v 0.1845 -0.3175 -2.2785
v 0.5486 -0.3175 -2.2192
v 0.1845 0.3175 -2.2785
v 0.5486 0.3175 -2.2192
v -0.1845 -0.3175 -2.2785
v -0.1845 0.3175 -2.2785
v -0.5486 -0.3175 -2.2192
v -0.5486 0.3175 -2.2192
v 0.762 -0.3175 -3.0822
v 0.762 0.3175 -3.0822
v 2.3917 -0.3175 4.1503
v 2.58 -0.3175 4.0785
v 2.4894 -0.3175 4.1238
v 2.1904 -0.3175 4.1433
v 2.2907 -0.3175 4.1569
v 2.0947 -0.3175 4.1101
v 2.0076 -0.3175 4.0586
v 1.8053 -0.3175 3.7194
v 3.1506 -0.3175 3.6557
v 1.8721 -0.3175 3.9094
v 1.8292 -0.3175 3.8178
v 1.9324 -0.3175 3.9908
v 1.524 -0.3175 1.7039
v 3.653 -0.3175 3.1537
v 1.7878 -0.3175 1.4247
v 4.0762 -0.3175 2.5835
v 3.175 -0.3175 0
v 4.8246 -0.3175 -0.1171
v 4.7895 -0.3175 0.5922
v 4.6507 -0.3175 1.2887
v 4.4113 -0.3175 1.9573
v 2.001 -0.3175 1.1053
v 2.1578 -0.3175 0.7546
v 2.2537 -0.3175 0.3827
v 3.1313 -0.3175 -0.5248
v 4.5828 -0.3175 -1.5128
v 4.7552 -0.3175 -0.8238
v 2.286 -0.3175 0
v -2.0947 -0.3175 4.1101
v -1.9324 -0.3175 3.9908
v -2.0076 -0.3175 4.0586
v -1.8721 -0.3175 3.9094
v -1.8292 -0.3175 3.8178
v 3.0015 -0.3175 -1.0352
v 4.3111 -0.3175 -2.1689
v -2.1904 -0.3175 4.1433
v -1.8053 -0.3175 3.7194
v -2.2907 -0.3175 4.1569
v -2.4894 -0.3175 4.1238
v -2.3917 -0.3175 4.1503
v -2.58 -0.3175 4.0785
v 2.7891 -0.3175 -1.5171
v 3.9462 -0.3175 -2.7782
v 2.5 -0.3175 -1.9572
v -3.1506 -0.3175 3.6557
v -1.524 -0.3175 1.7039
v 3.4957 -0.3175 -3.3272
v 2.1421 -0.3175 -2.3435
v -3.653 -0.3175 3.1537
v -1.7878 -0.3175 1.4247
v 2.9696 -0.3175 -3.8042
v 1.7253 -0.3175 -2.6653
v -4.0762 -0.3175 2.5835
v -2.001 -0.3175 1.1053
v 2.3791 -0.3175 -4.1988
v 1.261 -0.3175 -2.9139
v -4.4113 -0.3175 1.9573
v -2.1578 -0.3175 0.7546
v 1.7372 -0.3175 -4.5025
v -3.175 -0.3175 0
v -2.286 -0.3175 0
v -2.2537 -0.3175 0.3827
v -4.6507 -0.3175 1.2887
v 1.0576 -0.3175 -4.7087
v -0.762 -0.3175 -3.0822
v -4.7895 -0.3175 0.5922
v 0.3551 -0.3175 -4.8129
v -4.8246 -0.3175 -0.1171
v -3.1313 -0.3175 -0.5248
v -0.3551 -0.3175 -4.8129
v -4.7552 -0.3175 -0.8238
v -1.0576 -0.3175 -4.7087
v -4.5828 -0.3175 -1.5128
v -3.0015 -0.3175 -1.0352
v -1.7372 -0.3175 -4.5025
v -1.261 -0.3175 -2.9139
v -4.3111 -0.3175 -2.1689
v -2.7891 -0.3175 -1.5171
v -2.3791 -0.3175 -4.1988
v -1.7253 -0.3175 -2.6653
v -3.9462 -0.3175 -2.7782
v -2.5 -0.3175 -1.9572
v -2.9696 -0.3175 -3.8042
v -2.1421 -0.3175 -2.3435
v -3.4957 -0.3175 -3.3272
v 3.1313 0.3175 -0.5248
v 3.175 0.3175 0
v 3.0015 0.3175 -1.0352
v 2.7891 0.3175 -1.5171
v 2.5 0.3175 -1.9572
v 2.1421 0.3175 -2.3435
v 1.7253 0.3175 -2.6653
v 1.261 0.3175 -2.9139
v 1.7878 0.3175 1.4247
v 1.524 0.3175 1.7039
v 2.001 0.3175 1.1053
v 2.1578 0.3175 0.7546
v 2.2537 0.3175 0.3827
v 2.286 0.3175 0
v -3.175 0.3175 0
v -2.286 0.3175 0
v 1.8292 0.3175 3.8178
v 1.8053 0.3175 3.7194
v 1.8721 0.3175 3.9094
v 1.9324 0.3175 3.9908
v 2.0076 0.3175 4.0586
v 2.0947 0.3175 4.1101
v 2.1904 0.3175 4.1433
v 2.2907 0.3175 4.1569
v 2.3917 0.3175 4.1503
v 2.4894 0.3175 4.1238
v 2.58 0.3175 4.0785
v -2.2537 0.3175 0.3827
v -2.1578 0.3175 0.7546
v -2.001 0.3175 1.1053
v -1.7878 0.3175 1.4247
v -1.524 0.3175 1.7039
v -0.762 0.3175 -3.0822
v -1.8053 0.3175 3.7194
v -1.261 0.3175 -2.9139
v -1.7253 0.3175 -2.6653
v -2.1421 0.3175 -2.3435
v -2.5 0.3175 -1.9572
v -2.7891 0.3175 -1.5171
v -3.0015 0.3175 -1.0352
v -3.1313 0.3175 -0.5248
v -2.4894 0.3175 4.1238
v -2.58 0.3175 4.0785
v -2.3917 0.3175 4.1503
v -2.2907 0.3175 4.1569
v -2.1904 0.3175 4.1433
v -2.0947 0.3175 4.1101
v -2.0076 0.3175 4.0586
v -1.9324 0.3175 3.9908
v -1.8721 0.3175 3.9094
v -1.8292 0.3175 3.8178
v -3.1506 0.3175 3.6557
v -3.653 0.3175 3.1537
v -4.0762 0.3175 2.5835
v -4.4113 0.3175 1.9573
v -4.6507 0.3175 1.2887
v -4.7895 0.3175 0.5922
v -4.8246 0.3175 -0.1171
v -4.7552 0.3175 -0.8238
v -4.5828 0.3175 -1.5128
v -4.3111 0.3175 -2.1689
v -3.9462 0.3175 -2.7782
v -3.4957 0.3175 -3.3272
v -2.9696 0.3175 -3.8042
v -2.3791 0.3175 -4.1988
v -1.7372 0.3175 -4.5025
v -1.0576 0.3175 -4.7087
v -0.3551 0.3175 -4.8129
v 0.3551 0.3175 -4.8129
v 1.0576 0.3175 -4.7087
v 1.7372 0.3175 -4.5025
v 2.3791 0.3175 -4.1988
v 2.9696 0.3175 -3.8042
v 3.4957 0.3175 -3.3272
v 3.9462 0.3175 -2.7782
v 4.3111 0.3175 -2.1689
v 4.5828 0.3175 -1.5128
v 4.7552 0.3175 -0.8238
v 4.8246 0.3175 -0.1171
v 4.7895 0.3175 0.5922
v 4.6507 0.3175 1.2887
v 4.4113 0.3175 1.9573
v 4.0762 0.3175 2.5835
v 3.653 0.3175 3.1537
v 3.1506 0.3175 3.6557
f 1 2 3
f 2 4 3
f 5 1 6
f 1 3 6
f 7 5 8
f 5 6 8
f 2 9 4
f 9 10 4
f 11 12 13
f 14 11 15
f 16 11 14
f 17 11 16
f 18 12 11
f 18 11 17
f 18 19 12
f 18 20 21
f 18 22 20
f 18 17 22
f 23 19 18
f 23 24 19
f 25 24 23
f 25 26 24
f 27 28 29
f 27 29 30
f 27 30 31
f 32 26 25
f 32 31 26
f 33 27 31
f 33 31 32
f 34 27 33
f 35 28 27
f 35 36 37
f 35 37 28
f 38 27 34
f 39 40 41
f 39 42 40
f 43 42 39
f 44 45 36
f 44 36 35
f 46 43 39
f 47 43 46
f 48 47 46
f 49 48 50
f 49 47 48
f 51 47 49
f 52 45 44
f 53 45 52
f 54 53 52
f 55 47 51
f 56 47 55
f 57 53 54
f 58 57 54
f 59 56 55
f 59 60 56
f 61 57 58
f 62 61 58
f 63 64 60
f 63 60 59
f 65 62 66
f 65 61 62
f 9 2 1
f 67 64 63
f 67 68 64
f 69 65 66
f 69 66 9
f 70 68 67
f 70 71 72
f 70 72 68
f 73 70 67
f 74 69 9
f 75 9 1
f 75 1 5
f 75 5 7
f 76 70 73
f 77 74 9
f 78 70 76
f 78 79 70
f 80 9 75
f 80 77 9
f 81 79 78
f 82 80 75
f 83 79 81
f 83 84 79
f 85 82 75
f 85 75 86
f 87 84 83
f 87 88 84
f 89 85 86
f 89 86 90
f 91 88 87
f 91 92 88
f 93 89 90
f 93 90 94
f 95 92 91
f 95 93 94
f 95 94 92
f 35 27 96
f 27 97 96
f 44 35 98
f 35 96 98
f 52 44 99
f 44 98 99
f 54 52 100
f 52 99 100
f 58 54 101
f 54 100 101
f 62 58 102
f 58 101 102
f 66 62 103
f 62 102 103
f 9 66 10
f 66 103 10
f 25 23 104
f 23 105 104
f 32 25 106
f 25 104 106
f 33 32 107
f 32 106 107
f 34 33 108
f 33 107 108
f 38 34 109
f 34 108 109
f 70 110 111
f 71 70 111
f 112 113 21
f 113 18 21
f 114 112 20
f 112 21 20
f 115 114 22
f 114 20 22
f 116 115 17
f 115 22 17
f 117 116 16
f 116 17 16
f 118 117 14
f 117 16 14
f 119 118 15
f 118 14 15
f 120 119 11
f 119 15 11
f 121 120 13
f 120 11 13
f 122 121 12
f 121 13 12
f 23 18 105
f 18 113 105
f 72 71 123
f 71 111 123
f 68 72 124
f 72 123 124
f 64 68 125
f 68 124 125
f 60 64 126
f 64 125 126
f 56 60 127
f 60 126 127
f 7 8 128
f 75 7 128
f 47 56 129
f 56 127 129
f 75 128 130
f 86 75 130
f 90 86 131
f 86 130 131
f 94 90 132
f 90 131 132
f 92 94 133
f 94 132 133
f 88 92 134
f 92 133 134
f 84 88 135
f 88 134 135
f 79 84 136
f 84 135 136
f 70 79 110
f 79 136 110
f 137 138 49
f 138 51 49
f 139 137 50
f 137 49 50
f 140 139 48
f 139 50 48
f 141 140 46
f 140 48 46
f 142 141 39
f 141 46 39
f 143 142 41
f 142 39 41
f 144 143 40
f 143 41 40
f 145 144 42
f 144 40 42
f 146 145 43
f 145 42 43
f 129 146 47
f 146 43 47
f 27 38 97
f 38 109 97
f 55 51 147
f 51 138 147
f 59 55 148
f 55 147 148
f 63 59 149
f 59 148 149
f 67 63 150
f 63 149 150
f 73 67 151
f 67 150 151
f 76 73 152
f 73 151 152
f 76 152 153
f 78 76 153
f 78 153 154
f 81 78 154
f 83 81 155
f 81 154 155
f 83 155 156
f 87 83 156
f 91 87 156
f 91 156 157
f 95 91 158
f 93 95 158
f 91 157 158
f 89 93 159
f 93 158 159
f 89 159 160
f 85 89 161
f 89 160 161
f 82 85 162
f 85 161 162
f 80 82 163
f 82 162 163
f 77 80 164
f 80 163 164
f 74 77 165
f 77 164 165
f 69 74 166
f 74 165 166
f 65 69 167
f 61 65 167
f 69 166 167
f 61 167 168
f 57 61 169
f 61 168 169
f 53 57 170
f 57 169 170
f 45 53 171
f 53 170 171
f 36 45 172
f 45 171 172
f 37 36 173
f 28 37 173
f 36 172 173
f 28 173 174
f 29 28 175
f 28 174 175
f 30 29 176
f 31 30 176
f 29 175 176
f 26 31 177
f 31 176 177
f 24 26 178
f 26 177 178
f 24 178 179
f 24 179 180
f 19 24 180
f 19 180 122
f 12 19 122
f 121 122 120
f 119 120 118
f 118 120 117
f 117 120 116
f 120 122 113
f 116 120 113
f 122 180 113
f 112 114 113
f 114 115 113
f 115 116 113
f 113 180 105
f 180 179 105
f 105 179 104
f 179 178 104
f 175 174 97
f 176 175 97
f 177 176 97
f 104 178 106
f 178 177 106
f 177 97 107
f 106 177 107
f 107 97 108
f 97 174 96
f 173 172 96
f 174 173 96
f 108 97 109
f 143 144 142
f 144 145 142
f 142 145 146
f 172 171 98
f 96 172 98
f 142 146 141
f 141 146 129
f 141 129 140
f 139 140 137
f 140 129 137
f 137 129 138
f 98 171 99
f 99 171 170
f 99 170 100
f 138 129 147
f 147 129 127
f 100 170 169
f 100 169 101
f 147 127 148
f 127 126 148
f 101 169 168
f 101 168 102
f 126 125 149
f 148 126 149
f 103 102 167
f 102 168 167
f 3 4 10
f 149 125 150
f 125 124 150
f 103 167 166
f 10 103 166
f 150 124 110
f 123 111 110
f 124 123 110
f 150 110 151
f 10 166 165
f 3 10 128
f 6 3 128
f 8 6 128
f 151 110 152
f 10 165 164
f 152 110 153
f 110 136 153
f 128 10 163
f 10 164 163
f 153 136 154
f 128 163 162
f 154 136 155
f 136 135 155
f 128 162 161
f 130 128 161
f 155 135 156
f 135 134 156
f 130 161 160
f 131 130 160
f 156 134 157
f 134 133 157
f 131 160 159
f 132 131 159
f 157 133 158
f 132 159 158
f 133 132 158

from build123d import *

# Parameters (mm, degrees)
BOSS_EXTRUDE1_DEPTH = 0.3175
FILLET1_R           = 0.508


with BuildPart() as part:
    # Sketch2 → Boss-Extrude1 (new body, symmetric)
    with BuildSketch(Plane(origin=(0, 0, 0), x_dir=(1, 0, 0), z_dir=(0, 1, 0))):
        with BuildLine():
            Line((-3.175, 0), (-2.286, 0))
            ThreePointArc((-2.286, 0), (-2.086822944, -0.933255592), (-1.524, -1.703883799))
            Line((-1.524, -1.703883799), (-1.905, -4.434100924))
            ThreePointArc((-1.905, -4.434100924), (0, 4.826), (1.905, -4.434100924))
            Line((1.905, -4.434100924), (1.524, -1.703883799))
            ThreePointArc((1.524, -1.703883799), (2.086822944, -0.933255592), (2.286, 0))
            Line((2.286, 0), (3.175, 0))
            ThreePointArc((3.175, 0), (2.4999975, 1.957201446), (0.762, 3.082203919))
            Line((0.762, 3.082203919), (0.54864, 2.219186822))
            ThreePointArc((0.54864, 2.219186822), (0, 2.286), (-0.54864, 2.219186822))
            Line((-0.54864, 2.219186822), (-0.762, 3.082203919))
            ThreePointArc((-0.762, 3.082203919), (-2.4999975, 1.957201446), (-3.175, 0))
        make_face()
    extrude(amount=BOSS_EXTRUDE1_DEPTH, both=True)

    # Fillet1
    fillet1_edges = [part.edges().sort_by_distance(p)[0] for p in [
        (-1.905, 0, 4.434100924),
        (1.905, 0, 4.434100924),
    ]]
    fillet(fillet1_edges, radius=FILLET1_R)


solid = part.part
